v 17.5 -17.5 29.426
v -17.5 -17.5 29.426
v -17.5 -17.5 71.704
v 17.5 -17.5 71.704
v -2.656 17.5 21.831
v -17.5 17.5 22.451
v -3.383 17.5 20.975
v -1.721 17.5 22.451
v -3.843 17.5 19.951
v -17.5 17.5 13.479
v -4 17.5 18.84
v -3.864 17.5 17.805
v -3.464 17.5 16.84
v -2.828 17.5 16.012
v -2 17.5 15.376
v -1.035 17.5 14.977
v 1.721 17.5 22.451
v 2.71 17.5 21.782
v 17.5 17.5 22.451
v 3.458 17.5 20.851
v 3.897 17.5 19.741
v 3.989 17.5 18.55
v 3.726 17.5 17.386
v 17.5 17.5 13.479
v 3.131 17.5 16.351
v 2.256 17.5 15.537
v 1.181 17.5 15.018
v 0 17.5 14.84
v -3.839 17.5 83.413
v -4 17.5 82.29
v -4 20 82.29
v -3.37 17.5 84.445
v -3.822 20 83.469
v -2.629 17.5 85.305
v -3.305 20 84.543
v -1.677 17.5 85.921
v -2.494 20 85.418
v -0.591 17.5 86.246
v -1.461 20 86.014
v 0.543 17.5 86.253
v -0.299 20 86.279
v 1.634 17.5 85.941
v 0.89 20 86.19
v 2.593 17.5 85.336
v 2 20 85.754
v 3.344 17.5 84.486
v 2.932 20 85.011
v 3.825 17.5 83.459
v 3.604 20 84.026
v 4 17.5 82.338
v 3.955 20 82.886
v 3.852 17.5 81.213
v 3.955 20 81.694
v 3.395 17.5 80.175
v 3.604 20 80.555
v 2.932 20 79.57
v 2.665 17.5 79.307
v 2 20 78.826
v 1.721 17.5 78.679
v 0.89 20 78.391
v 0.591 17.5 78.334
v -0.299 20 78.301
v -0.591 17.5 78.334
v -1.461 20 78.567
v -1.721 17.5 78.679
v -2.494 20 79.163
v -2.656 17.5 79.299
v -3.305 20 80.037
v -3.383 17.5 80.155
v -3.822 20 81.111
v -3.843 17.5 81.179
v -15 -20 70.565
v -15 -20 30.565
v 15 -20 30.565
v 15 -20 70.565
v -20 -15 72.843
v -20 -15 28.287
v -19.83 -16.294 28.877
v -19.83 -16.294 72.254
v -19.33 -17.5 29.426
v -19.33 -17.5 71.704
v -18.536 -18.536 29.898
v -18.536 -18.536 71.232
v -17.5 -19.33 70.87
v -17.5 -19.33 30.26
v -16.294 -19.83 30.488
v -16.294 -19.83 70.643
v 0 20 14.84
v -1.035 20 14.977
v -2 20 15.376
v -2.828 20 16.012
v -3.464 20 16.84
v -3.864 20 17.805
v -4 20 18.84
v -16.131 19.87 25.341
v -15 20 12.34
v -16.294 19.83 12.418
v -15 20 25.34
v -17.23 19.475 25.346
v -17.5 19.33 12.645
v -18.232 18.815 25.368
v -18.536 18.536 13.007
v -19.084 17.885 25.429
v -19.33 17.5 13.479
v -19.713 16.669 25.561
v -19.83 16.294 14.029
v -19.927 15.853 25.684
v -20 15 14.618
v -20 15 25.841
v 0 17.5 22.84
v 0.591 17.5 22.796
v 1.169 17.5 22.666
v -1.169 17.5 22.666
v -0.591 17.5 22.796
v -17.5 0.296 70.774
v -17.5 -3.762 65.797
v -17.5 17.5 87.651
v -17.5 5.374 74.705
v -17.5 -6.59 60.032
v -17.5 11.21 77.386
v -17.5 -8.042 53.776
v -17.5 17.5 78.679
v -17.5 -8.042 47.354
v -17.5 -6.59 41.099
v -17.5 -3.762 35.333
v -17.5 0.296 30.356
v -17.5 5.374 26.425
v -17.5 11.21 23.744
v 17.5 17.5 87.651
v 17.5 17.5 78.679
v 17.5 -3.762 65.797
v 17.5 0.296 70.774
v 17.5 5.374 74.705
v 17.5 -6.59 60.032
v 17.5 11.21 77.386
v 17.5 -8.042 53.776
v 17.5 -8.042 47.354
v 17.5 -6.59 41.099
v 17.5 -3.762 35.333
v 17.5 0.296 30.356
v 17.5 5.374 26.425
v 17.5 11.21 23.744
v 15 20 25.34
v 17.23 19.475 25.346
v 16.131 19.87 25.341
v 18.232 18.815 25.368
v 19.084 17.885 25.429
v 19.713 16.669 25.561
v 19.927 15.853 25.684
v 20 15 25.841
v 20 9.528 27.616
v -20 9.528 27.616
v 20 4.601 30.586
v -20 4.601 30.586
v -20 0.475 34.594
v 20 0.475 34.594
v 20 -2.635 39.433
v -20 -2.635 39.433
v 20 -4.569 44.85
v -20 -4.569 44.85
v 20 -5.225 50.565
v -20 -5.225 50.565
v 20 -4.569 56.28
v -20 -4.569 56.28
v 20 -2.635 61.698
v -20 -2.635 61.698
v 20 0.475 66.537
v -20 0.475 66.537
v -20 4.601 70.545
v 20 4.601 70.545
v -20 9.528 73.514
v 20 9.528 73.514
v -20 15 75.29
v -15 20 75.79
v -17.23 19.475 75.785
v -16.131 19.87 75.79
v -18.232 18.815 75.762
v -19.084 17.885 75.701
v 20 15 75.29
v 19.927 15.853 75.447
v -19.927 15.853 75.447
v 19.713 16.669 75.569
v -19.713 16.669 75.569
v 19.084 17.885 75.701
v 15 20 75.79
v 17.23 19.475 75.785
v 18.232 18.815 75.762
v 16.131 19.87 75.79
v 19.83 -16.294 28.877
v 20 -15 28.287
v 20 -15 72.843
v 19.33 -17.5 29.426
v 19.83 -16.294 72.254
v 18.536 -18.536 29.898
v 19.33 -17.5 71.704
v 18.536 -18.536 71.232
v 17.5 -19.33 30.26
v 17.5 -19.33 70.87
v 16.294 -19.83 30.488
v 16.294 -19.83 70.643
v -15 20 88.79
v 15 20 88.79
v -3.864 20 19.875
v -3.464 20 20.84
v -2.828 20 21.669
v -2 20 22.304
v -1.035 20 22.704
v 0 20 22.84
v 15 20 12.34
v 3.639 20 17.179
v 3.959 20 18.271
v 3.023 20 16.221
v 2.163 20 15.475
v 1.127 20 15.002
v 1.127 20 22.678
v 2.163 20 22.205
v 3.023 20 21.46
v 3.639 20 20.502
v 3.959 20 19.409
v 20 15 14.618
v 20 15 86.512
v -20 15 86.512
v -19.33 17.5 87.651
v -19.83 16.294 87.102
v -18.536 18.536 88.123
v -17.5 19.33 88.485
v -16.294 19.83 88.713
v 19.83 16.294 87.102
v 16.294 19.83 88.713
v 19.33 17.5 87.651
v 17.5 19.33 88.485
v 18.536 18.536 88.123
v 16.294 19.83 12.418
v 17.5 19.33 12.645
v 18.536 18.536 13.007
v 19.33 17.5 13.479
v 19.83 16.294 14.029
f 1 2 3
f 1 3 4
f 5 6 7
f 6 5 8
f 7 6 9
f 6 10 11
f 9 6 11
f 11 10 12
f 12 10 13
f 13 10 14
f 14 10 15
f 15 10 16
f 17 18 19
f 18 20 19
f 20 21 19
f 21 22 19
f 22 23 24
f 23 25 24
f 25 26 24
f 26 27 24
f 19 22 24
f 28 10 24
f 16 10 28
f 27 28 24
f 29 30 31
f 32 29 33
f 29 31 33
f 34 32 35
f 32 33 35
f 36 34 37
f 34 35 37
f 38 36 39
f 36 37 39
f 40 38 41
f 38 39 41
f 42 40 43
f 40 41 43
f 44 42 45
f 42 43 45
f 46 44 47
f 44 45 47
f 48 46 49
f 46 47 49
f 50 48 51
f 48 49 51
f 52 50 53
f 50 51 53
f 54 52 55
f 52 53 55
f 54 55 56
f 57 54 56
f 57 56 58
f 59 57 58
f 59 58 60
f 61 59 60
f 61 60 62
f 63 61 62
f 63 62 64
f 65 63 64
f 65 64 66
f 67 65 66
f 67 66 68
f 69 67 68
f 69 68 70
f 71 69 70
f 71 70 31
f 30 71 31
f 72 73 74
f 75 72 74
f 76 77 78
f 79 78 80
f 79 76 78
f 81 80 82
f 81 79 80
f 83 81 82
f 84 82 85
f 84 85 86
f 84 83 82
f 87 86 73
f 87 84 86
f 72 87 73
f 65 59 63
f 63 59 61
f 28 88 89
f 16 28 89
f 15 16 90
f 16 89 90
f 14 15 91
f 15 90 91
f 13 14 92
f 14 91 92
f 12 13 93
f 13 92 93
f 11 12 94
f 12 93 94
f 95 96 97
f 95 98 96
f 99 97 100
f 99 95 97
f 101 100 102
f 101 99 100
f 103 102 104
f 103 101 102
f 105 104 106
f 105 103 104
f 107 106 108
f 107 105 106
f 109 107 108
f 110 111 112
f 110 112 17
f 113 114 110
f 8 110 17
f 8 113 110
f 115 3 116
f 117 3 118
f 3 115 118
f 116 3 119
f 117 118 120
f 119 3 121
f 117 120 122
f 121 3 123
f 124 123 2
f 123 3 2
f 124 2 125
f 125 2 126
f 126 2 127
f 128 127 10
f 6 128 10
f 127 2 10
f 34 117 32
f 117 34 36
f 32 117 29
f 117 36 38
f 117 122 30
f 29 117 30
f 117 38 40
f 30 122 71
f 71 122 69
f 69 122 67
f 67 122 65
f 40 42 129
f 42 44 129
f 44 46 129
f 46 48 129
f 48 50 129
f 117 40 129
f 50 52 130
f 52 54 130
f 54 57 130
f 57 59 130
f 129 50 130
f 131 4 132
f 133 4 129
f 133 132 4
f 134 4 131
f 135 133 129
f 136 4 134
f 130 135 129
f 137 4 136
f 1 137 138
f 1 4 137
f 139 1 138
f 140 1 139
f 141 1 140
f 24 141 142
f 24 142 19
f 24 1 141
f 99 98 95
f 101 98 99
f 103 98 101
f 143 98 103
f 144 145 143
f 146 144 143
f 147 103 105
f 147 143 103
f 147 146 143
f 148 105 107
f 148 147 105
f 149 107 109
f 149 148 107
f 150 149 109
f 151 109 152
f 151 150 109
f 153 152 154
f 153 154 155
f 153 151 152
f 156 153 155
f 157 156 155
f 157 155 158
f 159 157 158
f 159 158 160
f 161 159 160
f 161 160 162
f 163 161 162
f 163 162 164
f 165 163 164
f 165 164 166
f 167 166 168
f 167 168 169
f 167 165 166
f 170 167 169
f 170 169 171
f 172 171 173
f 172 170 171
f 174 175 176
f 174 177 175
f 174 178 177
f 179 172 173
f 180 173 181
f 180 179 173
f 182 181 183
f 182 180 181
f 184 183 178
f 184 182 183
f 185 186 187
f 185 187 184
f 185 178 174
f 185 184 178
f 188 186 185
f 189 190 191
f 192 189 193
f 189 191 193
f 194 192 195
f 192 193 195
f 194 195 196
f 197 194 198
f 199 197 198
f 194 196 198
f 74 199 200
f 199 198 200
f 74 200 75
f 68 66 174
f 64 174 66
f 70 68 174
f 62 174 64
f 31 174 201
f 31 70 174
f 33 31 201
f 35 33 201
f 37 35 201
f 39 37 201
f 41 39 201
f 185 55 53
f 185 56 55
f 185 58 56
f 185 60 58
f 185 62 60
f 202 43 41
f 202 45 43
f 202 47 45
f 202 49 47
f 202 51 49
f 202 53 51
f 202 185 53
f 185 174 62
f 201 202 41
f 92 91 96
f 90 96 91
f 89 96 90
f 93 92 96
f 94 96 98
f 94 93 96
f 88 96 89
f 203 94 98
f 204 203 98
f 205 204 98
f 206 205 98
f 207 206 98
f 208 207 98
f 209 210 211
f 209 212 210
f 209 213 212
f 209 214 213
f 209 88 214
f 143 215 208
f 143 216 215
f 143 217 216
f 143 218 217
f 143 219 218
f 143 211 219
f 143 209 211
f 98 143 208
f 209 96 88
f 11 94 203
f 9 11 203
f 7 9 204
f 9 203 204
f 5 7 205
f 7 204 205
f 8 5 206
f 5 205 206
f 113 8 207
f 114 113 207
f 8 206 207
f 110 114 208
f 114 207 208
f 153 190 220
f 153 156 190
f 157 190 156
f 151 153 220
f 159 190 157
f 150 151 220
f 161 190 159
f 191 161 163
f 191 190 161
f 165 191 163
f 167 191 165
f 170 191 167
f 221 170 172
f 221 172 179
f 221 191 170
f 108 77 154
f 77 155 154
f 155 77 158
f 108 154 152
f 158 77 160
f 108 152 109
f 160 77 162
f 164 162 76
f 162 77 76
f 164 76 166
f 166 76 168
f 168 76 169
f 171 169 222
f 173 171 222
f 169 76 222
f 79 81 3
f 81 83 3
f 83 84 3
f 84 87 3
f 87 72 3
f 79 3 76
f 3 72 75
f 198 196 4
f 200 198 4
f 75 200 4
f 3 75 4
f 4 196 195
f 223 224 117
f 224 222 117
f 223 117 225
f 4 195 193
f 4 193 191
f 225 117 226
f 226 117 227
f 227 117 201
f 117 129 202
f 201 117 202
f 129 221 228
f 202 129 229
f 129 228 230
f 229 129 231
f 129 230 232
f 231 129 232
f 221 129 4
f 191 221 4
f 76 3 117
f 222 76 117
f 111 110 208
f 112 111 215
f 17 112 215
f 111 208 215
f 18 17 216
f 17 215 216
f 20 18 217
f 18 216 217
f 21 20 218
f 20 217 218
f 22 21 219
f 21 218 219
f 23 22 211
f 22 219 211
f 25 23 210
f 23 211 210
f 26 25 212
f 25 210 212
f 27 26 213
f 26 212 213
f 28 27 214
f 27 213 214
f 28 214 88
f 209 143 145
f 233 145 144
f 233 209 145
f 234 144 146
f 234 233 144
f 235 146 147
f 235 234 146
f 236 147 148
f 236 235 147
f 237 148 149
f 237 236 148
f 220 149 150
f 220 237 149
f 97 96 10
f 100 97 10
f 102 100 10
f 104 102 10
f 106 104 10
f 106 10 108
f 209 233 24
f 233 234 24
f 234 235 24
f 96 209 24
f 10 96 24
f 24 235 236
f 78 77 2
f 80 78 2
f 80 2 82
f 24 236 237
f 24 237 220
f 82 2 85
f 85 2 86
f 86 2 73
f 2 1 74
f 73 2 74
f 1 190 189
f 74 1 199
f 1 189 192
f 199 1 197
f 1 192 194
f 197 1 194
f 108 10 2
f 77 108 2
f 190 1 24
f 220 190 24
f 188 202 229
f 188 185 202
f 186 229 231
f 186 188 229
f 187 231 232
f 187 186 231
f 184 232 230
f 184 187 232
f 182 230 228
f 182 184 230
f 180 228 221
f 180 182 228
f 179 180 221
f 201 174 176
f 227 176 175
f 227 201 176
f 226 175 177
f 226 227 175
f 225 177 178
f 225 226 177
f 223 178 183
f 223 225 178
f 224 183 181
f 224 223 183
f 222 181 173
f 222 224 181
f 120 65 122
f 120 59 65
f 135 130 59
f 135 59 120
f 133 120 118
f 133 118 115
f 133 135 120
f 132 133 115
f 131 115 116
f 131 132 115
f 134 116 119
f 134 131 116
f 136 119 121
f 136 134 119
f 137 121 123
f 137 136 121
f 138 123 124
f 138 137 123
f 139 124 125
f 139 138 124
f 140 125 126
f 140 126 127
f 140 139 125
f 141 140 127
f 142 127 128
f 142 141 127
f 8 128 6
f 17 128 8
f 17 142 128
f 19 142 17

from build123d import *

# Parameters (mm, degrees)
F0_W     = 40
F0_H     = 40
F0_W_2   = 35
F0_H_2   = 35
F1_DEPTH = 100
F3_DEPTH = 40.001
F4_DEPTH = 40
F5_R     = 4
F6_DEPTH = 2.5
F8_DEPTH = 2.5
F9_R     = 5


with BuildPart() as f1:
    # F0 (on Top) → F1 (new body)
    with BuildSketch(Plane.XY):
        Rectangle(F0_W, F0_H)
        Rectangle(F0_W_2, F0_H_2, mode=Mode.SUBTRACT)
    extrude(amount=F1_DEPTH)

    # F2 (on face) → F3 (cut, through all)
    with BuildSketch(Plane.YZ.offset(20)):
        with BuildLine():
            Line((20, 25.3402171373), (20, 75.7902171373))
            ThreePointArc((20, 75.7902171373), (-5.225, 50.5652171373), (20, 25.3402171373))
        make_face()
        with BuildLine():
            ThreePointArc((20, 25.3402171373), (-5.225, 50.5652171373), (20, 75.7902171373))
            Line((20, 75.7902171373), (20, 78.7902171373))
            ThreePointArc((20, 78.7902171373), (-8.225, 50.5652171373), (20, 22.3402171373))
            Line((20, 22.3402171373), (20, 25.3402171373))
        make_face()
        Polygon((20, 0), (20, 12.3402171373), (-20, 30.5652171373), (-20, 0), align=None)
        Polygon((-20, 70.5652171373), (20, 88.7902171373), (20, 100), (-20, 100), align=None)
    extrude(amount=-F3_DEPTH, mode=Mode.SUBTRACT)

    # F2 (on face) → F4 (join)
    with BuildSketch(Plane.YZ.offset(20)):
        with BuildLine():
            ThreePointArc((20, 25.3402171373), (-5.225, 50.5652171373), (20, 75.7902171373))
            Line((20, 75.7902171373), (20, 78.7902171373))
            ThreePointArc((20, 78.7902171373), (-8.225, 50.5652171373), (20, 22.3402171373))
            Line((20, 22.3402171373), (20, 25.3402171373))
        make_face()
    extrude(amount=-F4_DEPTH)

    # F5 (on face) → F6 (cut)
    with BuildSketch(Plane(origin=(0, 20, 0), x_dir=(-1, 0, 0), z_dir=(0, 1, 0))):
        with Locations((0, 82.2902171373)):
            Circle(F5_R)
    extrude(amount=-F6_DEPTH, mode=Mode.SUBTRACT)

    # F7 (on face) → F8 (cut)
    with BuildSketch(Plane(origin=(0, 20, 0), x_dir=(-1, 0, 0), z_dir=(0, 1, 0))):
        with BuildLine():
            ThreePointArc((0, 22.8402171373), (-4, 18.8402171373), (0, 14.8402171373))
            Line((0, 14.8402171373), (0, 22.8402171373))
        make_face()
        with BuildLine():
            Line((0, 22.8402171373), (0, 14.8402171373))
            ThreePointArc((0, 14.8402171373), (2.8284271247, 16.0117900126), (4, 18.8402171373))
            ThreePointArc((4, 18.8402171373), (2.8284271247, 21.6686442621), (0, 22.8402171373))
        make_face()
    extrude(amount=-F8_DEPTH, mode=Mode.SUBTRACT)

    # F9
    f9_edges = [f1.edges().sort_by_distance(p)[0] for p in [
        (-20, 20, 82.290217),
        (-20, 20, 18.840217),
        (-20, -20, 50.565217),
        (20, -20, 50.565217),
        (20, 20, 18.840217),
        (20, 20, 82.290217),
    ]]
    fillet(f9_edges, radius=F9_R)


solid = f1.part
